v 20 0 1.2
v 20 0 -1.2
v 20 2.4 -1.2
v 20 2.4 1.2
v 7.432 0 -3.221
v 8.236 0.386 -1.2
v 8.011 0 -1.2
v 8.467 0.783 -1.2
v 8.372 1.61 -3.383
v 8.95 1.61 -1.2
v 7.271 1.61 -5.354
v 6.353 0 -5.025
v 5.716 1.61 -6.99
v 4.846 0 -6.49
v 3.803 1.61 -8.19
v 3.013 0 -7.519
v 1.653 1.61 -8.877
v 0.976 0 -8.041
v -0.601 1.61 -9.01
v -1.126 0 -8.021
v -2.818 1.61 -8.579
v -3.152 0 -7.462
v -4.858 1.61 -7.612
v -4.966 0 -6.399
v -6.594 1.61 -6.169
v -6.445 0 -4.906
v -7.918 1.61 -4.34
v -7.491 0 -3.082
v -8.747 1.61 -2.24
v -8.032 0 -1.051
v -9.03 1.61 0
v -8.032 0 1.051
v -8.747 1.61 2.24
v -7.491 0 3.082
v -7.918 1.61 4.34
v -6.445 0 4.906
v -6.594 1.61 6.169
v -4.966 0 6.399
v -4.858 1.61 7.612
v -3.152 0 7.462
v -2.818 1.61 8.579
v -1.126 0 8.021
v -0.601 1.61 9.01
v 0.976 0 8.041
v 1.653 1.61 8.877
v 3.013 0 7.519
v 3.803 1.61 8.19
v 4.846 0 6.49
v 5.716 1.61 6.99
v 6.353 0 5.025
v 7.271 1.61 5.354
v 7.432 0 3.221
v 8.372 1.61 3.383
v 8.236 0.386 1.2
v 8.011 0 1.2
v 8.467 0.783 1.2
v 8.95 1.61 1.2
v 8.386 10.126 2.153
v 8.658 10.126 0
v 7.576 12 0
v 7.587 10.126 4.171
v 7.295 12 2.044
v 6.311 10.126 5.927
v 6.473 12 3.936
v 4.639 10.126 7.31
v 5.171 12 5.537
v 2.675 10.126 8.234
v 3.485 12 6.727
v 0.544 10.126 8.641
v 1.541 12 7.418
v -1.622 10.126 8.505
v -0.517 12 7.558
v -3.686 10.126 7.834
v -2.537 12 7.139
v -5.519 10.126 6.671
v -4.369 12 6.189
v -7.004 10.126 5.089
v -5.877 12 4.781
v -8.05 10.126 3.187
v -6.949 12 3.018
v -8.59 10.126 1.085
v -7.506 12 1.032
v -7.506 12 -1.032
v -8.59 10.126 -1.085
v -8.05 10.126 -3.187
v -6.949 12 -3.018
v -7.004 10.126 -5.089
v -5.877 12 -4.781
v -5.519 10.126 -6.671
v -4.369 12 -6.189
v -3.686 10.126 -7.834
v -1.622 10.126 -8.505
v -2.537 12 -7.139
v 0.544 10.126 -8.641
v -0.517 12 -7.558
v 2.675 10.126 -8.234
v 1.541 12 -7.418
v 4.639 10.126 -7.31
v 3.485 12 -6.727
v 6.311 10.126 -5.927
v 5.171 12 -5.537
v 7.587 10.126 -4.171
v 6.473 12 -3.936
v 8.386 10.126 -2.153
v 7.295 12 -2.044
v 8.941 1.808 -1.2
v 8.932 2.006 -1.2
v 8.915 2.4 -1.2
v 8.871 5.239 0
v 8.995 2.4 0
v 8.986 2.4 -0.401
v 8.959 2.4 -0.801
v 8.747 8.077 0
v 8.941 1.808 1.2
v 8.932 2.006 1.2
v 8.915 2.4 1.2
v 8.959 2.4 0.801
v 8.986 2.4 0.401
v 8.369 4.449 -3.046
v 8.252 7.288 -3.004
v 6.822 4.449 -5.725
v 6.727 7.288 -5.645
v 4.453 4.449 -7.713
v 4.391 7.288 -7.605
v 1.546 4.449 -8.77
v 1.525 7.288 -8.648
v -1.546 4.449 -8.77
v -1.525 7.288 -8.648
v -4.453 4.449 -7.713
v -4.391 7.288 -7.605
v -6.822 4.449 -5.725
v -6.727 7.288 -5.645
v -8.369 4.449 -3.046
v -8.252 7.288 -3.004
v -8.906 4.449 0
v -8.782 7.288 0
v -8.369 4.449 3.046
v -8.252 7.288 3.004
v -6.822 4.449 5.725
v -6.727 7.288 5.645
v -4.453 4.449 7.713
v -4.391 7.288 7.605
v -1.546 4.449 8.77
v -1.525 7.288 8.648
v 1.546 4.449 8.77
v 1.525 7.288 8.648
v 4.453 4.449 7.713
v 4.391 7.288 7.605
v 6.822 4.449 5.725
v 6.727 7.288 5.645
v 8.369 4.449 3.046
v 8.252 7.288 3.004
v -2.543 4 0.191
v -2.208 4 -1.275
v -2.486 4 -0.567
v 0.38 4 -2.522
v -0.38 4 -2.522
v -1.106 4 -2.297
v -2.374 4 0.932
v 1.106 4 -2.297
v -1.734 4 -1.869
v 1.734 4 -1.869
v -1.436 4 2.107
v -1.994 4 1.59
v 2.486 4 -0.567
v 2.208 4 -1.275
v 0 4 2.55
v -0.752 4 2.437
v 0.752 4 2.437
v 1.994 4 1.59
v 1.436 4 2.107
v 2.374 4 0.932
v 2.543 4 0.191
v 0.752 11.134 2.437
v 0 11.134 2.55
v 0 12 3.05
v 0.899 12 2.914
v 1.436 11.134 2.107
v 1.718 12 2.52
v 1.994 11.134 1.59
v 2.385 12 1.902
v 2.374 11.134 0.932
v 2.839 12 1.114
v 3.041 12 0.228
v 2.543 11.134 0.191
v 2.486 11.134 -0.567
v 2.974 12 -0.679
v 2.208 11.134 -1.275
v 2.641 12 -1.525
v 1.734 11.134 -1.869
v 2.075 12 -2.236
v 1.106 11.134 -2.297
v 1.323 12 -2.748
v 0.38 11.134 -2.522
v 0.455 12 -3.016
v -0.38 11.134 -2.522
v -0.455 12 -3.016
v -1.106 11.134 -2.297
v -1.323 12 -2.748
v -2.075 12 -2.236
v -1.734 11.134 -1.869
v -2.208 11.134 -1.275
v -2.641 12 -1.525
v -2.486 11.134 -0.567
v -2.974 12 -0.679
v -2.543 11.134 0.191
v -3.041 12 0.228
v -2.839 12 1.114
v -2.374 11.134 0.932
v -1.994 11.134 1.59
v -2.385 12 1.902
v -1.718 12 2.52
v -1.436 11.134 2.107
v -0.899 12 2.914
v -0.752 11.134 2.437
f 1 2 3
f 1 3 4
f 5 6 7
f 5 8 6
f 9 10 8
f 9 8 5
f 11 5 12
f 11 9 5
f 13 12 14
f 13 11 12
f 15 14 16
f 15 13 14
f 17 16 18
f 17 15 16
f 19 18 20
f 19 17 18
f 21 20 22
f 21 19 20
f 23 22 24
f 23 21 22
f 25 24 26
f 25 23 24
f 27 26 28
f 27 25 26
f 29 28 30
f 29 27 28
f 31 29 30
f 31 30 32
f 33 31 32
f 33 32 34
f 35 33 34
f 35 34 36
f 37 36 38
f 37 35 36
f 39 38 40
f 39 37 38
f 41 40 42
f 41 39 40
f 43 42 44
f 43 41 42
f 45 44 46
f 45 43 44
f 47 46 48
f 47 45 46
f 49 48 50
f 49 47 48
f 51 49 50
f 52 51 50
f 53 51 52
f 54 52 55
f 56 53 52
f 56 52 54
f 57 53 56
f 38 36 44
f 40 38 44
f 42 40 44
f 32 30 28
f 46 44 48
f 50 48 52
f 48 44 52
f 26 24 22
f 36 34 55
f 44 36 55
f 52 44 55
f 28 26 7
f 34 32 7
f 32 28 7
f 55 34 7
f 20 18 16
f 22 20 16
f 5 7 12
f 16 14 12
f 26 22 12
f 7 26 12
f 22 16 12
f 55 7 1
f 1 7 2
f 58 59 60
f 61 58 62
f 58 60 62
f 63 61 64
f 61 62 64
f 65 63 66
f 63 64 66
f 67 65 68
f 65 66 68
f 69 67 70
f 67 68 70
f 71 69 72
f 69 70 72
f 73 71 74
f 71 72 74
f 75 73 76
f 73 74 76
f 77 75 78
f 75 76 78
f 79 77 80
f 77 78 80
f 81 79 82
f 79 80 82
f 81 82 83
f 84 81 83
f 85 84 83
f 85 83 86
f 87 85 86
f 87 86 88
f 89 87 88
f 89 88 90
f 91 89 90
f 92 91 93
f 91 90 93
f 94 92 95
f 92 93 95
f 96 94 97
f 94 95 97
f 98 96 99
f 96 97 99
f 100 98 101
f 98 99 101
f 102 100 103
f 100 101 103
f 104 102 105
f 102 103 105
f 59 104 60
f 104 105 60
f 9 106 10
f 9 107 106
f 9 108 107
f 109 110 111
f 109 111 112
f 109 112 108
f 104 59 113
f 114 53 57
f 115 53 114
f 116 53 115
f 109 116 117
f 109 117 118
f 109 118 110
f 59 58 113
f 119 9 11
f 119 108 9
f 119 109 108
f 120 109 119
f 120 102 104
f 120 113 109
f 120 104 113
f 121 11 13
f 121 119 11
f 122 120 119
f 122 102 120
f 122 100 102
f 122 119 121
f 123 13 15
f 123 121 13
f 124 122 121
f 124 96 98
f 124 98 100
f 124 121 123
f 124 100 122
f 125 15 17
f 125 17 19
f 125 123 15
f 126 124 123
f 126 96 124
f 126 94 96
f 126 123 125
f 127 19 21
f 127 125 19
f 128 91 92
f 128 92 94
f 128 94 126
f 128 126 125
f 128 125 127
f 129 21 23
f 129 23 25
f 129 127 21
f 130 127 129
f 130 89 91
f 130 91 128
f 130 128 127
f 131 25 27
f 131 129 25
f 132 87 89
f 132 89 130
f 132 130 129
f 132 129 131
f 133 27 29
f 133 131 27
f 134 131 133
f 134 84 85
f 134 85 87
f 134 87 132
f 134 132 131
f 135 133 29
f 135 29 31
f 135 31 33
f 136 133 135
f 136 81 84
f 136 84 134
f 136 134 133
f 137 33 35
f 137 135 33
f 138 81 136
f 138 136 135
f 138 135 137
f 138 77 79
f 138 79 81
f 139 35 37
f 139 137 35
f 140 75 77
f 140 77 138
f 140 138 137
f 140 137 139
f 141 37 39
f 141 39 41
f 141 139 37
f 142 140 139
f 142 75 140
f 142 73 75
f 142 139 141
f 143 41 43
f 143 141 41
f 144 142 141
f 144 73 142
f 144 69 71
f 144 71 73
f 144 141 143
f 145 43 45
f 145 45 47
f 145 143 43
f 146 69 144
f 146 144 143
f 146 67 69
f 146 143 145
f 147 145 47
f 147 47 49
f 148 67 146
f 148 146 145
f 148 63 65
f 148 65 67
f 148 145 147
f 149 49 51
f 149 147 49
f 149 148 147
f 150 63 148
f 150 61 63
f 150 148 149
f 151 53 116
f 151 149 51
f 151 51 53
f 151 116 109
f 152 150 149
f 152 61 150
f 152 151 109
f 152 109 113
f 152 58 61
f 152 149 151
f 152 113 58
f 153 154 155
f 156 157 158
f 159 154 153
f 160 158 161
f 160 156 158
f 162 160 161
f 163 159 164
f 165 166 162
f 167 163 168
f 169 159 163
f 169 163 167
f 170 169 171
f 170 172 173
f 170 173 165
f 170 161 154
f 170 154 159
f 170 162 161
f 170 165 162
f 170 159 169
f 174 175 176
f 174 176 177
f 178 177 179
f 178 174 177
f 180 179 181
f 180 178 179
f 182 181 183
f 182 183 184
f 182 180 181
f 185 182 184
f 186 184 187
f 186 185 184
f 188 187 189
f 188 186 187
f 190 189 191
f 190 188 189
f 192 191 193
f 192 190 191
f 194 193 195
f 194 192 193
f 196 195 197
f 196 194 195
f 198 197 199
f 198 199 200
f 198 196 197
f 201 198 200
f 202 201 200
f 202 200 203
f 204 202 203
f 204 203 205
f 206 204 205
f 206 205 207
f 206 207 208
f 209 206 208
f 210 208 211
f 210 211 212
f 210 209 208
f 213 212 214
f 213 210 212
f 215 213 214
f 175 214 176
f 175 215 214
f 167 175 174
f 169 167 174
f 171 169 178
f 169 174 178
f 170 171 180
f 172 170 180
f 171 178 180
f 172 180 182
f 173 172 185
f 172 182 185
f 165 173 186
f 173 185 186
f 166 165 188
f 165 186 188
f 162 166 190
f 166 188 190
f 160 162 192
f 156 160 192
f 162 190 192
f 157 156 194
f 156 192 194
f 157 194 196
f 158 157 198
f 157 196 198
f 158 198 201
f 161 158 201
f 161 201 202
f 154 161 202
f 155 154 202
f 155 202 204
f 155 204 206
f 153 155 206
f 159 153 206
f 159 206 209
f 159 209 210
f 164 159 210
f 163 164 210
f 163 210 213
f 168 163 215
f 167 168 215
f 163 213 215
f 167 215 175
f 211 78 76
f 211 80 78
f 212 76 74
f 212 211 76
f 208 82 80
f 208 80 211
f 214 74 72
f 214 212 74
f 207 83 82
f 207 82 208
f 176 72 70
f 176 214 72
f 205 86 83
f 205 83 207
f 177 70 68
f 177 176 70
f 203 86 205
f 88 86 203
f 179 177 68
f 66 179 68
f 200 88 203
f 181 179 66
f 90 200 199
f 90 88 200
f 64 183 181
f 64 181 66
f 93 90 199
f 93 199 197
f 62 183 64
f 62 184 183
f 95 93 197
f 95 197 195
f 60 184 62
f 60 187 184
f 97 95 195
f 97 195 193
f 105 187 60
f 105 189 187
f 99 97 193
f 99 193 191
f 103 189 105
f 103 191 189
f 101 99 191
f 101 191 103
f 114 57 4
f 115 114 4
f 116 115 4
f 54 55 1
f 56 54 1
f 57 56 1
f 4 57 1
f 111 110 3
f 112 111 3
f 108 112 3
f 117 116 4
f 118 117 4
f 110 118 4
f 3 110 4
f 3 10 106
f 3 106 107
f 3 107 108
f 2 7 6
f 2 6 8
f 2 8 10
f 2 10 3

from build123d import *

# Parameters (mm, degrees)
SKETCH_1_R          = 9.1
EXTRUDE_1_DEPTH     = 12
EXTRUDE_1_TAPER     = 2.5
SKETCH_2_R          = 2.55
CUT_EXTRUDE_1_DEPTH = 8
SKETCH_3_W          = 13
SKETCH_3_H          = 2.4
EXTRUDE_2_DEPTH     = 2.4
CHAMFER_1_SIZE      = 0.5
CHAMFER_1_SIZE2     = 0.866025404
CHAMFER_2_SIZE      = 1
CHAMFER_2_SIZE2     = 1.611810972
CHAMFER_3_SIZE      = 1.87553439
CHAMFER_3_SIZE_2    = 1


with BuildPart() as part:
    # 草图1 → 凸台-拉伸1 (new body)
    with BuildSketch(Plane(origin=(0, 0, 0), x_dir=(1, 0, 0), z_dir=(0, 1, 0))):
        Circle(SKETCH_1_R)
    extrude(amount=EXTRUDE_1_DEPTH, taper=EXTRUDE_1_TAPER)

    # 草图2 → 切除-拉伸1 (cut)
    with BuildSketch(Plane(origin=(0, 12, 0), x_dir=(1, 0, 0), z_dir=(0, 1, 0))):
        with Locations(Location((0, 0, 0), (0, 0, 270))):
            Circle(SKETCH_2_R)
    extrude(amount=-CUT_EXTRUDE_1_DEPTH, mode=Mode.SUBTRACT)

    # 草图3 → 凸台-拉伸2 (add)
    with BuildSketch(Plane.XZ):
        with Locations((13.5, 0)):
            Rectangle(SKETCH_3_W, SKETCH_3_H)
    extrude(amount=-EXTRUDE_2_DEPTH)

    # 倒角1
    chamfer_1_edges = [part.edges().sort_by_distance(p)[0] for p in [
        (0, 12, -2.55),
    ]]
    chamfer_1_side = [part.faces().sort_by_distance(p)[0] for p in [
        (-8.333500832, 12, 0),
    ]]
    chamfer(chamfer_1_edges, length=CHAMFER_1_SIZE, length2=CHAMFER_1_SIZE2, reference=chamfer_1_side[0])

    # 倒角2
    chamfer_2_edges = [part.edges().sort_by_distance(p)[0] for p in [
        (-9.1, 0, 0),
    ]]
    chamfer_2_side = [part.faces().sort_by_distance(p)[0] for p in [
        (1.331118316, 0, 0),
    ]]
    chamfer(chamfer_2_edges, length=CHAMFER_2_SIZE, length2=CHAMFER_2_SIZE2, reference=chamfer_2_side[0])

    # 倒角3
    # the kernel refuses this chamfer: 1.87553439, 1 mm, written as the material it takes off along each edge
    with BuildSketch(Plane(origin=(0, 12, 0), x_dir=(1, 0, 0), z_dir=(0, 0, -1))) as chamfer_3_piece_1:
        Polygon((8.576068685 + CHAMFER_3_SIZE * 0.0436193873717, CHAMFER_3_SIZE * 0.999048221729), (8.576068685 - CHAMFER_3_SIZE_2, 0), (8.576068685, 0), align=None)
    revolve(axis=Axis((0, 12, 0), (0, -1, 0)), mode=Mode.SUBTRACT)


solid = part.part
